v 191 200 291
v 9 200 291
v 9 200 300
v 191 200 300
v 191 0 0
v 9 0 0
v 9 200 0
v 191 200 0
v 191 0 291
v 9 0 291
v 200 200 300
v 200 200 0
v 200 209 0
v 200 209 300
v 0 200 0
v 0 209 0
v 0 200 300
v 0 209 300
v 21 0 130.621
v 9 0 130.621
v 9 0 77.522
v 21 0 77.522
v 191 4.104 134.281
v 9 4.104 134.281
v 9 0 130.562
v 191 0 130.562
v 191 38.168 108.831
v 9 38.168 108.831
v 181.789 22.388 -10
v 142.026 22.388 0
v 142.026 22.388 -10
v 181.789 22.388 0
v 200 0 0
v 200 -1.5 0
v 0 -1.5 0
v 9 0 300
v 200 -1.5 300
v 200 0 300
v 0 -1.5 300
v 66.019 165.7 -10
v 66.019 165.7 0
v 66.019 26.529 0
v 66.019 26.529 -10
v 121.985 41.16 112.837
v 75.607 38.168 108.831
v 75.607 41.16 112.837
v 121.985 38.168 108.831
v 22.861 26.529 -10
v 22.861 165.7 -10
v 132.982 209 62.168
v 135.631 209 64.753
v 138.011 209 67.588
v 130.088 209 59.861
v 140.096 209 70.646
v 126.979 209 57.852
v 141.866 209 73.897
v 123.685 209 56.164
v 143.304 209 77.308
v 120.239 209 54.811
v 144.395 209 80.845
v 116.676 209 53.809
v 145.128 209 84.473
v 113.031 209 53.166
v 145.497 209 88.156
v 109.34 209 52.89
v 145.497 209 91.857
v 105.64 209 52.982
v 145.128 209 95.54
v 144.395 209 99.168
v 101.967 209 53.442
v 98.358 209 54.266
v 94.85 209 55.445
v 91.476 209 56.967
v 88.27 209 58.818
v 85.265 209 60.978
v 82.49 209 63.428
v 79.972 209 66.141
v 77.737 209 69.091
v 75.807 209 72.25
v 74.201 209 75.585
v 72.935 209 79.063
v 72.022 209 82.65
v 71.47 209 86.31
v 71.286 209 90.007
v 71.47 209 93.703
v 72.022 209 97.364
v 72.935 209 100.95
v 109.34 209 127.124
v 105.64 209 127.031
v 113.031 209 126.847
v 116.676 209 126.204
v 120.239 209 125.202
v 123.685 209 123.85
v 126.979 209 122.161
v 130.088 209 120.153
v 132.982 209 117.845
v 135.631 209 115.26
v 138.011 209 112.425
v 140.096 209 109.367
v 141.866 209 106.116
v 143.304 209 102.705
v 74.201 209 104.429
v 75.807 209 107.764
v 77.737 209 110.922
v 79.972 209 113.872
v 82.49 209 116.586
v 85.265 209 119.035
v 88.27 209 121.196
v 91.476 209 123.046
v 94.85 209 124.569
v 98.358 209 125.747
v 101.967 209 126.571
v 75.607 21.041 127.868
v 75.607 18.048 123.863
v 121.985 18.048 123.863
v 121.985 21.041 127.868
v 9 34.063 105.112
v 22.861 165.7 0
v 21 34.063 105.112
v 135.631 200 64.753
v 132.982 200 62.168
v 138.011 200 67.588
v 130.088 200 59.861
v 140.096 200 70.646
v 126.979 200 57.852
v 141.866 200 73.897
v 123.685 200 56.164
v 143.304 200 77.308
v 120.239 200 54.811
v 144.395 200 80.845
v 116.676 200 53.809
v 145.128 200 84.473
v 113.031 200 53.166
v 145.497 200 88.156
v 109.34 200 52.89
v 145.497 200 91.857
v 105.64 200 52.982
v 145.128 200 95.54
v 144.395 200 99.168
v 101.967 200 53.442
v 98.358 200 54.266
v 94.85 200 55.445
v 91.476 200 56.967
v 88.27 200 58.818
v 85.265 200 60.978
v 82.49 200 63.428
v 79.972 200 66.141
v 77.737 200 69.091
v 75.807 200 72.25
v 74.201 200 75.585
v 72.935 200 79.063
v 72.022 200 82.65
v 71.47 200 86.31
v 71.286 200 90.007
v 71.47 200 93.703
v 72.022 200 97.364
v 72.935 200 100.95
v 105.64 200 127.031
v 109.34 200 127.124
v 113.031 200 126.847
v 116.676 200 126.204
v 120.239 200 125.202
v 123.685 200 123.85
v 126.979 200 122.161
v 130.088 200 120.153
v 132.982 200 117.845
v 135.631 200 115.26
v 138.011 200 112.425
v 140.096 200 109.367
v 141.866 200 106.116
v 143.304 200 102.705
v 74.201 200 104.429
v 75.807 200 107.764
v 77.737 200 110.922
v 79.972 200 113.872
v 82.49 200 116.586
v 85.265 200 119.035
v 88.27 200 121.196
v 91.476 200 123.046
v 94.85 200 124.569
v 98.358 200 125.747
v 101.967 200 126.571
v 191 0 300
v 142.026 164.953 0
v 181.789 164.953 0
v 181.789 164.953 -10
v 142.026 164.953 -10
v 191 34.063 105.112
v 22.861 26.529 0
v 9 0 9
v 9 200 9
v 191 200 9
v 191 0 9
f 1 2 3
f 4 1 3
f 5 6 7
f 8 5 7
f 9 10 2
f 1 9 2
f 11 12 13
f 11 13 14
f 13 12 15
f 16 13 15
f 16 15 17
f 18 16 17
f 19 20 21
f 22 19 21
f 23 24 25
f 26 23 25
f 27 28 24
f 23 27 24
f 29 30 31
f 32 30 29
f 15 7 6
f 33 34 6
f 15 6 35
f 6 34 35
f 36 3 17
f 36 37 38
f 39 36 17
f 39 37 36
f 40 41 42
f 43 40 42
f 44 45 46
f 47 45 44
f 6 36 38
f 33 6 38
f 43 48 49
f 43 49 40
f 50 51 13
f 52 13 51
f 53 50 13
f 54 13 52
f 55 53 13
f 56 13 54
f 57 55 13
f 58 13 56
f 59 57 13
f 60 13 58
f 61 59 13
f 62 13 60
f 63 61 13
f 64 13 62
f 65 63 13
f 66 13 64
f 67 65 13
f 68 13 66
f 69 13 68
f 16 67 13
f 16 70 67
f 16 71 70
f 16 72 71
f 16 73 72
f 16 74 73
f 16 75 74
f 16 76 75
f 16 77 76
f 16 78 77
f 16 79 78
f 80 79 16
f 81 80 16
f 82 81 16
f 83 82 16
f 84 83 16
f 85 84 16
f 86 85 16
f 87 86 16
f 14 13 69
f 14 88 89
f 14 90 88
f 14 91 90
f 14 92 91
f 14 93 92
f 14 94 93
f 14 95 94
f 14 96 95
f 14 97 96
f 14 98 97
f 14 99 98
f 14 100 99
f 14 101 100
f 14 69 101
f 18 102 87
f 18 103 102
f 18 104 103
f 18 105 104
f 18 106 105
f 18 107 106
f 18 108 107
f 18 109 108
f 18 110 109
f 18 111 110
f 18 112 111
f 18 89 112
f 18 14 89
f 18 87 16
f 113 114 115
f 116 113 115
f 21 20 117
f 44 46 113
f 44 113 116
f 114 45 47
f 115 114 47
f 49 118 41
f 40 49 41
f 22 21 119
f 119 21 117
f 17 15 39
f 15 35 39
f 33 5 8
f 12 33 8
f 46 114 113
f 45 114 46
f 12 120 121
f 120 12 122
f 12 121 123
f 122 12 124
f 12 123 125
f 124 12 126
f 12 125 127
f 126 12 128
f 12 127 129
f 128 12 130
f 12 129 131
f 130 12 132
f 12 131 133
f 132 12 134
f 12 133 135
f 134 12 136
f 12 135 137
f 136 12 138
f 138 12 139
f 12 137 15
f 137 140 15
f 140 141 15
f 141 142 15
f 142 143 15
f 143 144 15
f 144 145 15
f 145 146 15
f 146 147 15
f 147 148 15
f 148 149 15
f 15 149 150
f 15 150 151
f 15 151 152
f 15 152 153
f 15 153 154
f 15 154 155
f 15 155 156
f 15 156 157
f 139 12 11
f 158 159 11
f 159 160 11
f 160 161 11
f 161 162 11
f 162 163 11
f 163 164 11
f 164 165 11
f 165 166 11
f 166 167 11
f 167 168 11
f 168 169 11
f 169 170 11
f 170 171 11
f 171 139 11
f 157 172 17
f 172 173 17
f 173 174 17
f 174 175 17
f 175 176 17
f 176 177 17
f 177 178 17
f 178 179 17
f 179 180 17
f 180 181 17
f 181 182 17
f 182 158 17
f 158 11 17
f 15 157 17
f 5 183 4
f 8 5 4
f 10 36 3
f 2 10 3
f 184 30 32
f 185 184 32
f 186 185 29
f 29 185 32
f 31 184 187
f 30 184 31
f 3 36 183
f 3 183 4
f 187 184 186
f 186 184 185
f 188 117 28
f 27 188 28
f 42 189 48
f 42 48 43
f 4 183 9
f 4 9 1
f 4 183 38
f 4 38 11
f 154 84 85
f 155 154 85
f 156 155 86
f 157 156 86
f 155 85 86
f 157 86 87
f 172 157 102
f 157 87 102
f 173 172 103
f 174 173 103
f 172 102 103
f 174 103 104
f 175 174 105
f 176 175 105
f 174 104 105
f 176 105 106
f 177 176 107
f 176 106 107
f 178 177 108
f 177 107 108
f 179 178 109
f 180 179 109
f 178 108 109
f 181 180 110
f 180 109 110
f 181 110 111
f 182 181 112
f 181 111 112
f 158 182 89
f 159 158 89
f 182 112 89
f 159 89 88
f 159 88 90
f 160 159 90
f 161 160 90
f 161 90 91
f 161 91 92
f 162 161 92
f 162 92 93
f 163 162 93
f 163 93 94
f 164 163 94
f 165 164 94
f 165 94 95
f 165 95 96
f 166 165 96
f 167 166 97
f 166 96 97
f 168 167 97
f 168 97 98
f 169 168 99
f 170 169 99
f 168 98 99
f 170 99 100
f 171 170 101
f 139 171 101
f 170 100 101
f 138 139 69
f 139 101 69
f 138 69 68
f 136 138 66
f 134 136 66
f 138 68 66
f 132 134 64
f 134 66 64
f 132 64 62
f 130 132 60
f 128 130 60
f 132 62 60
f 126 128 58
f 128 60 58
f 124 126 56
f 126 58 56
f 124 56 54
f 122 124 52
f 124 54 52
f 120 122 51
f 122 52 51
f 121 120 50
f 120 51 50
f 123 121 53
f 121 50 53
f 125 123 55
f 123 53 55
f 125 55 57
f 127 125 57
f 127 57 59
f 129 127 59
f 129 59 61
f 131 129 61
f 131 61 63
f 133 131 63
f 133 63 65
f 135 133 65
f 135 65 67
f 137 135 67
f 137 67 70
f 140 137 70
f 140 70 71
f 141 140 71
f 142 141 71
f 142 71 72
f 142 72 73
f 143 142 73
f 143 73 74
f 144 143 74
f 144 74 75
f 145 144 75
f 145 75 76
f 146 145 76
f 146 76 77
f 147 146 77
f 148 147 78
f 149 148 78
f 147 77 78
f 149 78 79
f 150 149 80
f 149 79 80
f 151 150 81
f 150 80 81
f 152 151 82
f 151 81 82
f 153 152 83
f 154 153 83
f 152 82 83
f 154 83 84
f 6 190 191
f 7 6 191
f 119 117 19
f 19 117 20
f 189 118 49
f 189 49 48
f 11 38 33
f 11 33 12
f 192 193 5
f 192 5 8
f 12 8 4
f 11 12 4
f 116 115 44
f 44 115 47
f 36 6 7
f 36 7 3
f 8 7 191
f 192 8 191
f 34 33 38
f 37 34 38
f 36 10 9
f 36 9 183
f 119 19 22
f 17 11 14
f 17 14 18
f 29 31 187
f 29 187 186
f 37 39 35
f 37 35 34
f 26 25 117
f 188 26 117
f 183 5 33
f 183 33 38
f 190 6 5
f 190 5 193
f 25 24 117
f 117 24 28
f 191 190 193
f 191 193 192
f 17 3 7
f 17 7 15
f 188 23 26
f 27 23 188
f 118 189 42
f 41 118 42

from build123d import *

# Parameters (mm, degrees)
F0_W      = 200
F0_H      = 300
F1_DEPTH  = 1.5
F2_W      = 9
F2_H      = 300
F3_DEPTH  = 200
F5_DEPTH  = 12
F7_DEPTH  = 182
F8_W      = 46.3780984282
F8_H      = 25.1142808329
F9_DEPTH  = 5
F10_W     = 200
F10_H     = 9
F11_DEPTH = 182
F12_W     = 200
F12_H     = 9
F13_DEPTH = 182
F14_W     = 200
F14_H     = 300
F15_DEPTH = 9
F16_W     = 200
F16_H     = 300
F17_DEPTH = 9
F18_R     = 37.1285508671
F19_DEPTH = 9
F20_W     = 39.7629290819
F20_H     = 142.5646618009
F21_DEPTH = 10
F22_W     = 43.1573316455
F22_H     = 139.1702704132
F23_DEPTH = 10


with BuildPart() as f1:
    # F0 (on Front) → F1 (new body)
    with BuildSketch(Plane.XZ):
        with Locations((100, 150)):
            Rectangle(F0_W, F0_H)
    extrude(amount=F1_DEPTH)

    # F2 (on face) → F3 (join)
    with BuildSketch(Plane(origin=(0, 0, 0), x_dir=(-1, 0, 0), z_dir=(0, 1, 0))):
        with Locations((-4.5, 150)):
            Rectangle(F2_W, F2_H)
    extrude(amount=F3_DEPTH)


with BuildPart() as f5:
    # F4 (on face) → F5 (new body)
    with BuildSketch(Plane.YZ.offset(9)):
        Polygon((34.0634658933, 105.1124706864), (0, 130.6207180023), (0, 77.5219127536), align=None)
    extrude(amount=F5_DEPTH)


with BuildPart() as f7:
    # F6 (on face) → F7 (new body)
    with BuildSketch(Plane.YZ.offset(9)):
        Polygon((0, 130.56217134), (34.0634658933, 105.1124706864), (38.1676233374, 108.8311001658), (4.1041574441, 134.2808008194), align=None)
    extrude(amount=F7_DEPTH)


with BuildPart() as f9:
    # F8 (on face) → F9 (new body)
    with BuildSketch(Plane(origin=(0, 65.8553375905, 88.1448892638), x_dir=(1, 0, 0), z_dir=(0, 0.5985254585, 0.8011037858))):
        with Locations((98.7963713706, -47.1190969879)):
            Rectangle(F8_W, F8_H)
    extrude(amount=F9_DEPTH)


with BuildPart() as f11:
    # F10 (on face) → F11 (new body)
    with BuildSketch(Plane.YZ.offset(9)):
        with Locations((100, 295.5)):
            Rectangle(F10_W, F10_H)
    extrude(amount=F11_DEPTH)


with BuildPart() as f13:
    # F12 (on face) → F13 (new body)
    with BuildSketch(Plane.YZ.offset(9)):
        with Locations((100, 4.5)):
            Rectangle(F12_W, F12_H)
    extrude(amount=F13_DEPTH)


with BuildPart() as f15:
    # F14 (on face) → F15 (new body)
    with BuildSketch(Plane.YZ.offset(191)):
        with Locations((100, 150)):
            Rectangle(F14_W, F14_H)
    extrude(amount=F15_DEPTH)


with BuildPart() as f17:
    # F16 (on face) → F17 (new body)
    with BuildSketch(Plane(origin=(0, 200, 0), x_dir=(-1, 0, 0), z_dir=(0, 1, 0))):
        with Locations((-100, 150)):
            Rectangle(F16_W, F16_H)
    extrude(amount=F17_DEPTH)

    # F18 (on face) → F19 (cut)
    with BuildSketch(Plane(origin=(0, 209, 0), x_dir=(-1, 0, 0), z_dir=(0, 1, 0))):
        with Locations((-108.4143146873, 90.0066271424)):
            Circle(F18_R)
    extrude(amount=-F19_DEPTH, mode=Mode.SUBTRACT)


with BuildPart() as f21:
    # F20 (on face) → F21 (new body)
    with BuildSketch(Plane(origin=(0, 0, 0), x_dir=(1, 0, 0), z_dir=(0, 0, -1))):
        with Locations((161.907337606, -93.6702601612)):
            Rectangle(F20_W, F20_H)
    extrude(amount=F21_DEPTH)


with BuildPart() as f23:
    # F22 (on face) → F23 (new body)
    with BuildSketch(Plane(origin=(0, 0, 0), x_dir=(1, 0, 0), z_dir=(0, 0, -1))):
        with Locations((44.4398485124, -96.1144361645)):
            Rectangle(F22_W, F22_H)
    extrude(amount=F23_DEPTH)


solid = Compound([f1.part, f5.part, f7.part, f9.part, f11.part, f13.part, f15.part, f17.part, f21.part, f23.part])
